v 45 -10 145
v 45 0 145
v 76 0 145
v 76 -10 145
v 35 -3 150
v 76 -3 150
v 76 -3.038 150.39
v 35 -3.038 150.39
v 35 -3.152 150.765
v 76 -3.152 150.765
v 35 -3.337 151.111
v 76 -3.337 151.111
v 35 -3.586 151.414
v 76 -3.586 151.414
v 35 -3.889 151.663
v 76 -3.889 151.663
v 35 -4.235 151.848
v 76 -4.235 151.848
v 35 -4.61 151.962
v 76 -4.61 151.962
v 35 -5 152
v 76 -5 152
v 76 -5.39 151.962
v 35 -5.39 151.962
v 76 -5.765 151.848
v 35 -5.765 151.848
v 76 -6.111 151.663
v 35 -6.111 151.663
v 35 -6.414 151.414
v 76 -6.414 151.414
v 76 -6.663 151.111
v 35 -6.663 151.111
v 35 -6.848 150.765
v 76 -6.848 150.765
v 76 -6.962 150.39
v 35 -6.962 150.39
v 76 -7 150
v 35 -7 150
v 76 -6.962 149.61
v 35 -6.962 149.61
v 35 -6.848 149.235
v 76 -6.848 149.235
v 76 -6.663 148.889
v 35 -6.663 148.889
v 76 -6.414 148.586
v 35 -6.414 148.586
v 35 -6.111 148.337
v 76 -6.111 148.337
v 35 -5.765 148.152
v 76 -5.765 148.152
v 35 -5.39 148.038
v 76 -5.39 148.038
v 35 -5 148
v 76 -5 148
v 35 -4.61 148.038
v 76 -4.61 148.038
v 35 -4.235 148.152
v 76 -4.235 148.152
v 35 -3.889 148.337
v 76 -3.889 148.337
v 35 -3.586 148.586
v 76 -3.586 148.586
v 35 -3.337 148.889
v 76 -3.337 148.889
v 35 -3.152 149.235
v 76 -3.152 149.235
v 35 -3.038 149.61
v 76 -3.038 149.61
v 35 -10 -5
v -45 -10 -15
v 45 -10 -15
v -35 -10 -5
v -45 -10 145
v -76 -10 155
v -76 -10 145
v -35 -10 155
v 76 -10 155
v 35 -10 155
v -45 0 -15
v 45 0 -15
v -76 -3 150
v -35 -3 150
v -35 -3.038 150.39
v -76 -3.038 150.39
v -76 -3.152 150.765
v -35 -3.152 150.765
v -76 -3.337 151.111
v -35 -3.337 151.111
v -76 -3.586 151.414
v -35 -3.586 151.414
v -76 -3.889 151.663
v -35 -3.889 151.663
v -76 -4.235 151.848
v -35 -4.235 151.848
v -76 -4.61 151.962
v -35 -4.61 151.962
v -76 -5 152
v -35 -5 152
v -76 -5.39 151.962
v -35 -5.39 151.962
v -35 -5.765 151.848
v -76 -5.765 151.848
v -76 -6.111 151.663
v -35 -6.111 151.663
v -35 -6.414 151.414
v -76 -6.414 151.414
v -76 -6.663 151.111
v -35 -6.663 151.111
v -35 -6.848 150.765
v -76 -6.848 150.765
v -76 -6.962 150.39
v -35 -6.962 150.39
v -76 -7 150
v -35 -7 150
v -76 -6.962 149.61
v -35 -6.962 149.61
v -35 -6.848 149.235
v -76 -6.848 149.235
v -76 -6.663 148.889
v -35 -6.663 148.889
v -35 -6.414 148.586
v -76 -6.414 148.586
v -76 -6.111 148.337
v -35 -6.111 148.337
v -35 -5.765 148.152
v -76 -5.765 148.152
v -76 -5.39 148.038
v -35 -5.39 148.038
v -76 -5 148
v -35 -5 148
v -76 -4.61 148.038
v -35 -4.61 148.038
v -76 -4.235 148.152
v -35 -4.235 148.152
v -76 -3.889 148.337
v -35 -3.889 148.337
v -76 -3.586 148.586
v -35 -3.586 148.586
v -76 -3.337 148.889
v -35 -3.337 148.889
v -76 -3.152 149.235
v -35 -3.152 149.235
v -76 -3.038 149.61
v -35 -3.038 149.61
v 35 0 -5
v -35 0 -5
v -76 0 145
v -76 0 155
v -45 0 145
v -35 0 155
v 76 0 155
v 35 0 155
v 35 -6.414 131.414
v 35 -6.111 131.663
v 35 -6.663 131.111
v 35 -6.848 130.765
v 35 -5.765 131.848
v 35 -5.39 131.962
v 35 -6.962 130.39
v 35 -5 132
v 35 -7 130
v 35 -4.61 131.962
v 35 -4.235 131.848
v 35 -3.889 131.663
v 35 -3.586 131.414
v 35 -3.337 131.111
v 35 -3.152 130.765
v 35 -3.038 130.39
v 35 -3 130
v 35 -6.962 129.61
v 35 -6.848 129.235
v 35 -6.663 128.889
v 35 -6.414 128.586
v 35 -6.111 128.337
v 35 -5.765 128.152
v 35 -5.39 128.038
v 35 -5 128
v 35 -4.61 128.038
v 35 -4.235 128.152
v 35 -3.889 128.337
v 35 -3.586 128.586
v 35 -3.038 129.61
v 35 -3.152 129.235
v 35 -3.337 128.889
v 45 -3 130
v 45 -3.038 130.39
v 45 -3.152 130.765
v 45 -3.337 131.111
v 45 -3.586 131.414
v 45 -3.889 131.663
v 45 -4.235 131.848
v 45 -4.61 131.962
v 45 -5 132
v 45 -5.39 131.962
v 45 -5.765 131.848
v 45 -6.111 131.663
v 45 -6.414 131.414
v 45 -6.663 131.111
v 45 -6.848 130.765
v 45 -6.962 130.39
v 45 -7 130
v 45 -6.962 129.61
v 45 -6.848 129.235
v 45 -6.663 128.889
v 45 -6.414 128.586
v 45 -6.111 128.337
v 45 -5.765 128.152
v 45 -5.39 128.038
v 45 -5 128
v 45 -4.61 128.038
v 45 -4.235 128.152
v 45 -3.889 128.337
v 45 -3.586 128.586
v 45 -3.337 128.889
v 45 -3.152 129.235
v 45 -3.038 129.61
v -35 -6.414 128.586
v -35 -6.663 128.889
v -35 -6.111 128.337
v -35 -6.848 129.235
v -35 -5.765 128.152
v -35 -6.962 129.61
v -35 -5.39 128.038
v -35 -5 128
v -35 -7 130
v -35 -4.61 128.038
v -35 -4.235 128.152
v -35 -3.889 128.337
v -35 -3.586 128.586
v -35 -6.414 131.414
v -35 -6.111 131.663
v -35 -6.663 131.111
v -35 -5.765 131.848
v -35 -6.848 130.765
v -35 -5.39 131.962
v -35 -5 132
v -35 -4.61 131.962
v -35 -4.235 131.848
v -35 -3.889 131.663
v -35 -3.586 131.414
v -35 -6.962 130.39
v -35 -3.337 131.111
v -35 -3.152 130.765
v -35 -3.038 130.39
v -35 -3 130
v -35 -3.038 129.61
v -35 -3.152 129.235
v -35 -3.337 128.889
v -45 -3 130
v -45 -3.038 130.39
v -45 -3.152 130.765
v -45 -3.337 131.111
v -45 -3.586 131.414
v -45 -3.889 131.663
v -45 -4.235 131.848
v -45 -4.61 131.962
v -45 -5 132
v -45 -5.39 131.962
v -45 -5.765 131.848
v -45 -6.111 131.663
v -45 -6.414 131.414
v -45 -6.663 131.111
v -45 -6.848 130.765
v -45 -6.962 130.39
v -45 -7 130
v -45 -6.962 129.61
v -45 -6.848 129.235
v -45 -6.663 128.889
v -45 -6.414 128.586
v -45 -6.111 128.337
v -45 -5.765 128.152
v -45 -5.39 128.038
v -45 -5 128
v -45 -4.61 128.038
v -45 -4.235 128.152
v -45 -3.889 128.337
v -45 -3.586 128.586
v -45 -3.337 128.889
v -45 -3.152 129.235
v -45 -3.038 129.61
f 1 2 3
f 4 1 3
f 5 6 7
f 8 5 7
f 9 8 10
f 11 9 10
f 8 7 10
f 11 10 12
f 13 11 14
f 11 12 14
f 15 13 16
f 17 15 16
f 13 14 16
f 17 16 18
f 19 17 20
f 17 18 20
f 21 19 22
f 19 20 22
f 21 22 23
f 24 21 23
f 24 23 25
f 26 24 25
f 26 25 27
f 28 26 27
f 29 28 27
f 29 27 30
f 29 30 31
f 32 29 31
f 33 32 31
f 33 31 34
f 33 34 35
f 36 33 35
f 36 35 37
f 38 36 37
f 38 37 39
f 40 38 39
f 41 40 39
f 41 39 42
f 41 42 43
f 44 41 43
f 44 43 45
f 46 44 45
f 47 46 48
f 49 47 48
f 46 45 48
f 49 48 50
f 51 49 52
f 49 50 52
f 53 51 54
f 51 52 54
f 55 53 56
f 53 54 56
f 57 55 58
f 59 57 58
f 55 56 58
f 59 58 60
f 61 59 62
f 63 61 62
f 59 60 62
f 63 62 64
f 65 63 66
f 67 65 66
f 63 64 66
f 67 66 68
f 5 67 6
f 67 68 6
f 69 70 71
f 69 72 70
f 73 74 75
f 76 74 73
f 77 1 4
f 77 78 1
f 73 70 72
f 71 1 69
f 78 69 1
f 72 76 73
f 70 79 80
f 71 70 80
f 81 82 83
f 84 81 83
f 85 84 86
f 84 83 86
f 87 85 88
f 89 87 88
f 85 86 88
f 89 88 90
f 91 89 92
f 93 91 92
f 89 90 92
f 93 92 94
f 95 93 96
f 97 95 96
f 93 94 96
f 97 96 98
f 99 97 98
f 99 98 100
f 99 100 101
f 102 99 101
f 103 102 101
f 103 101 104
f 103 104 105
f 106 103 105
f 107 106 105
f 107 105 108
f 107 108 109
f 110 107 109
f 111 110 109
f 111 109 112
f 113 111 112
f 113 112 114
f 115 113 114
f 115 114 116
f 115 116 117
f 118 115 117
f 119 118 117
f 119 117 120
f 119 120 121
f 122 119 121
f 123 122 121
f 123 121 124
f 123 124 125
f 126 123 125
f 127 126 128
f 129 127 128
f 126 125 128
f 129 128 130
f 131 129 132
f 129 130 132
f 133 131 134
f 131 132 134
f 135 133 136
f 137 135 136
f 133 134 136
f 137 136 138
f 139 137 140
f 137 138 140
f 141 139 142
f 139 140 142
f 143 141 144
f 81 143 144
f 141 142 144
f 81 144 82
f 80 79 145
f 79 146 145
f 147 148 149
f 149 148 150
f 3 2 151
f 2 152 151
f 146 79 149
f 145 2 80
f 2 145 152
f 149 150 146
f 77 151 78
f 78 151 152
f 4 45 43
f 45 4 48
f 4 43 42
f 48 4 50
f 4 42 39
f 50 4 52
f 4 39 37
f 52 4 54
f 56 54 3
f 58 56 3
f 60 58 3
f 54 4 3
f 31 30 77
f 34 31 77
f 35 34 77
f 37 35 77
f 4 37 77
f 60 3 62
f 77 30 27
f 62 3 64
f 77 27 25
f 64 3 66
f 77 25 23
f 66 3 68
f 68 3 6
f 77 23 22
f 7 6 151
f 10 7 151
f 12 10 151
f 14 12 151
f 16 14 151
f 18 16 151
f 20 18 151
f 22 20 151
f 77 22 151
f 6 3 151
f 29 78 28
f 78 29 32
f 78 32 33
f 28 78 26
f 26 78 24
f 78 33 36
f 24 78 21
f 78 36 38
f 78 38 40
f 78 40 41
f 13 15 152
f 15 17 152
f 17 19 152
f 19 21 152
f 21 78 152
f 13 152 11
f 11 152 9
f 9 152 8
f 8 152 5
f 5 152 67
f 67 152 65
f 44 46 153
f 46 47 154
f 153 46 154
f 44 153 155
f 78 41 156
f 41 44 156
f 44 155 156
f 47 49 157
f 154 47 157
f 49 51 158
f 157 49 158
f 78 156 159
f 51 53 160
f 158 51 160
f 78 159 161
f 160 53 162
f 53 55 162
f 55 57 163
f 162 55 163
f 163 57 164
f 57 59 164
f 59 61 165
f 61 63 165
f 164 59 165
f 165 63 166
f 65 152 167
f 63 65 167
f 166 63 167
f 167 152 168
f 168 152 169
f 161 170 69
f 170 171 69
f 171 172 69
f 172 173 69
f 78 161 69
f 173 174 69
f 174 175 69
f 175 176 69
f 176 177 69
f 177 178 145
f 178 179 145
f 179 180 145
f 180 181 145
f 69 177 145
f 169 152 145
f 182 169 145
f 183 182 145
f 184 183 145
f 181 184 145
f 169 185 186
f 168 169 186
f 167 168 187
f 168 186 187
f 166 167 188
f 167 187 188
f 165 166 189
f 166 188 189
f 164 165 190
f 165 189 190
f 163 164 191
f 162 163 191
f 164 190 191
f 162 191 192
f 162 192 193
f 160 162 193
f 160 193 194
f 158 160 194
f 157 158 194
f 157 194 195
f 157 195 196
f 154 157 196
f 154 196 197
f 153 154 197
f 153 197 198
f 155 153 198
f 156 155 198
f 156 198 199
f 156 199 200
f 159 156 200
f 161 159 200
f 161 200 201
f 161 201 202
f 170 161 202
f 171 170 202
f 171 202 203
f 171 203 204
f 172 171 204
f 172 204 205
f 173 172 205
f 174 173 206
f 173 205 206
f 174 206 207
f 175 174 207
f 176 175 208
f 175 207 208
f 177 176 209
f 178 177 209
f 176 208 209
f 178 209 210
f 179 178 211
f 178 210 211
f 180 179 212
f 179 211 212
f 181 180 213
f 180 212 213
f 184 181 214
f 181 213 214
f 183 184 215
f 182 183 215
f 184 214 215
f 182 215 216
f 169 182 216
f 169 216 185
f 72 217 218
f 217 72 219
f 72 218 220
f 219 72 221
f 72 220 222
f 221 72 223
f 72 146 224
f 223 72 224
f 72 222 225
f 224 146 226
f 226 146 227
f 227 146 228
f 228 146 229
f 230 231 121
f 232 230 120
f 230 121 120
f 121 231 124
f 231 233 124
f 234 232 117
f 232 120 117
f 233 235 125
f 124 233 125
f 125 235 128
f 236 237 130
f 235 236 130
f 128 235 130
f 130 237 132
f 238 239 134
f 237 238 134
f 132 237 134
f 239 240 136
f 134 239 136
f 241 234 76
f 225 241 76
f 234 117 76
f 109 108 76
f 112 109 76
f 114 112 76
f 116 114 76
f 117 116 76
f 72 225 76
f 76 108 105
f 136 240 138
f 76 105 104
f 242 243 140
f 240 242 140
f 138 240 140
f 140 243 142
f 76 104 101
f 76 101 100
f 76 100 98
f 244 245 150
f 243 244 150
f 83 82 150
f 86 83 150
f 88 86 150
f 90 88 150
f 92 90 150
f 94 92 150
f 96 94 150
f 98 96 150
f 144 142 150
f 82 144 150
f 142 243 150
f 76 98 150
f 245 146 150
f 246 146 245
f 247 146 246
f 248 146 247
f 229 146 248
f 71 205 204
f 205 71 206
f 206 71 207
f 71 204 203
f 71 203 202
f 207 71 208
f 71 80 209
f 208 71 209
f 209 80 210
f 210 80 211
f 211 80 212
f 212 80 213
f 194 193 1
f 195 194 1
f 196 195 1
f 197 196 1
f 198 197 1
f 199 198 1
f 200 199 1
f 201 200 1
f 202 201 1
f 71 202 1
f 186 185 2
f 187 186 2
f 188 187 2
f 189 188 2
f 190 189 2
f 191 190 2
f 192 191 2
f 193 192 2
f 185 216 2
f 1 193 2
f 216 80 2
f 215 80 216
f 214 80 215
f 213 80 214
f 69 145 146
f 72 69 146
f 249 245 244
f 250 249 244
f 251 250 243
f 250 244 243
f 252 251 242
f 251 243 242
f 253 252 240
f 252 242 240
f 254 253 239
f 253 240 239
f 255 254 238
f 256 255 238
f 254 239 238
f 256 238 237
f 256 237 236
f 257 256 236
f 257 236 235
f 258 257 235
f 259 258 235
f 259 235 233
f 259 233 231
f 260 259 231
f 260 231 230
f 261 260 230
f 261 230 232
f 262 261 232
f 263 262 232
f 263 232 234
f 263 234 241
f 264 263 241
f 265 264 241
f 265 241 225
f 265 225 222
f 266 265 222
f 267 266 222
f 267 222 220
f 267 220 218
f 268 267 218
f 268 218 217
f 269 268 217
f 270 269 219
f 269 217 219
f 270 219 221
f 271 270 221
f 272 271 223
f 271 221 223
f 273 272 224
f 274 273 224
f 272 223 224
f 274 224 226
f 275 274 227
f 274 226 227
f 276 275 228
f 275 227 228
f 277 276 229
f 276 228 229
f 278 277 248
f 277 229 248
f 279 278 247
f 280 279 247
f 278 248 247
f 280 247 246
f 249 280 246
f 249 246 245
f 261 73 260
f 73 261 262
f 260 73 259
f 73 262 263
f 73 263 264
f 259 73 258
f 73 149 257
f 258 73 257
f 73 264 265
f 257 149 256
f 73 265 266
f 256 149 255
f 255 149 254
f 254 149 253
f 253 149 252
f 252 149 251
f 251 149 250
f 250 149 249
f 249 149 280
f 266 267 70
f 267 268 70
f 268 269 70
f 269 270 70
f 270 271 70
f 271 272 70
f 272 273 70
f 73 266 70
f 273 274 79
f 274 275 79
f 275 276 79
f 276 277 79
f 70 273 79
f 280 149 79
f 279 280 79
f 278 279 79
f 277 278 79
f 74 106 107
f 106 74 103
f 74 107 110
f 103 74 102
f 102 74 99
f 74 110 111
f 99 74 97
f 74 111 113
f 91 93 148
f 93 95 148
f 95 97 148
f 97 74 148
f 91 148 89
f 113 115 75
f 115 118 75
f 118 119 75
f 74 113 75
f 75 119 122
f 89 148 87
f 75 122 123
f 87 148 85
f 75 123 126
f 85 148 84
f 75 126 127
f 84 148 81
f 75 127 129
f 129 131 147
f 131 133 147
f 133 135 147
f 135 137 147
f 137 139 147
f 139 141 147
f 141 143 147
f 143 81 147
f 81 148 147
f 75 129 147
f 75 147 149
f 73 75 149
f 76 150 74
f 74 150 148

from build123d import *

# Parameters (mm, degrees)
F1_DEPTH = 10
F2_R     = 2
F3_DEPTH = 152.001
F4_R     = 2
F5_DEPTH = 121.001


with BuildPart() as f1:
    # F0 (on Front) → F1 (new body)
    with BuildSketch(Plane.XZ):
        Polygon((-45, 145), (-45, -15), (45, -15), (45, 145), (76, 145), (76, 155), (35, 155), (35, -5), (0, -5), (-35, -5), (-35, 155), (-76, 155), (-76, 145), align=None)
    extrude(amount=F1_DEPTH)

    # F2 (on face) → F3 (cut, through all)
    with BuildSketch(Plane.YZ.offset(76)):
        with Locations((-5, 150)):
            Circle(F2_R)
    extrude(amount=-F3_DEPTH, mode=Mode.SUBTRACT)

    # F4 (on face) → F5 (cut, through all)
    with BuildSketch(Plane.YZ.offset(45)):
        with Locations((-5, 130)):
            Circle(F4_R)
    extrude(amount=-F5_DEPTH, mode=Mode.SUBTRACT)


solid = f1.part
